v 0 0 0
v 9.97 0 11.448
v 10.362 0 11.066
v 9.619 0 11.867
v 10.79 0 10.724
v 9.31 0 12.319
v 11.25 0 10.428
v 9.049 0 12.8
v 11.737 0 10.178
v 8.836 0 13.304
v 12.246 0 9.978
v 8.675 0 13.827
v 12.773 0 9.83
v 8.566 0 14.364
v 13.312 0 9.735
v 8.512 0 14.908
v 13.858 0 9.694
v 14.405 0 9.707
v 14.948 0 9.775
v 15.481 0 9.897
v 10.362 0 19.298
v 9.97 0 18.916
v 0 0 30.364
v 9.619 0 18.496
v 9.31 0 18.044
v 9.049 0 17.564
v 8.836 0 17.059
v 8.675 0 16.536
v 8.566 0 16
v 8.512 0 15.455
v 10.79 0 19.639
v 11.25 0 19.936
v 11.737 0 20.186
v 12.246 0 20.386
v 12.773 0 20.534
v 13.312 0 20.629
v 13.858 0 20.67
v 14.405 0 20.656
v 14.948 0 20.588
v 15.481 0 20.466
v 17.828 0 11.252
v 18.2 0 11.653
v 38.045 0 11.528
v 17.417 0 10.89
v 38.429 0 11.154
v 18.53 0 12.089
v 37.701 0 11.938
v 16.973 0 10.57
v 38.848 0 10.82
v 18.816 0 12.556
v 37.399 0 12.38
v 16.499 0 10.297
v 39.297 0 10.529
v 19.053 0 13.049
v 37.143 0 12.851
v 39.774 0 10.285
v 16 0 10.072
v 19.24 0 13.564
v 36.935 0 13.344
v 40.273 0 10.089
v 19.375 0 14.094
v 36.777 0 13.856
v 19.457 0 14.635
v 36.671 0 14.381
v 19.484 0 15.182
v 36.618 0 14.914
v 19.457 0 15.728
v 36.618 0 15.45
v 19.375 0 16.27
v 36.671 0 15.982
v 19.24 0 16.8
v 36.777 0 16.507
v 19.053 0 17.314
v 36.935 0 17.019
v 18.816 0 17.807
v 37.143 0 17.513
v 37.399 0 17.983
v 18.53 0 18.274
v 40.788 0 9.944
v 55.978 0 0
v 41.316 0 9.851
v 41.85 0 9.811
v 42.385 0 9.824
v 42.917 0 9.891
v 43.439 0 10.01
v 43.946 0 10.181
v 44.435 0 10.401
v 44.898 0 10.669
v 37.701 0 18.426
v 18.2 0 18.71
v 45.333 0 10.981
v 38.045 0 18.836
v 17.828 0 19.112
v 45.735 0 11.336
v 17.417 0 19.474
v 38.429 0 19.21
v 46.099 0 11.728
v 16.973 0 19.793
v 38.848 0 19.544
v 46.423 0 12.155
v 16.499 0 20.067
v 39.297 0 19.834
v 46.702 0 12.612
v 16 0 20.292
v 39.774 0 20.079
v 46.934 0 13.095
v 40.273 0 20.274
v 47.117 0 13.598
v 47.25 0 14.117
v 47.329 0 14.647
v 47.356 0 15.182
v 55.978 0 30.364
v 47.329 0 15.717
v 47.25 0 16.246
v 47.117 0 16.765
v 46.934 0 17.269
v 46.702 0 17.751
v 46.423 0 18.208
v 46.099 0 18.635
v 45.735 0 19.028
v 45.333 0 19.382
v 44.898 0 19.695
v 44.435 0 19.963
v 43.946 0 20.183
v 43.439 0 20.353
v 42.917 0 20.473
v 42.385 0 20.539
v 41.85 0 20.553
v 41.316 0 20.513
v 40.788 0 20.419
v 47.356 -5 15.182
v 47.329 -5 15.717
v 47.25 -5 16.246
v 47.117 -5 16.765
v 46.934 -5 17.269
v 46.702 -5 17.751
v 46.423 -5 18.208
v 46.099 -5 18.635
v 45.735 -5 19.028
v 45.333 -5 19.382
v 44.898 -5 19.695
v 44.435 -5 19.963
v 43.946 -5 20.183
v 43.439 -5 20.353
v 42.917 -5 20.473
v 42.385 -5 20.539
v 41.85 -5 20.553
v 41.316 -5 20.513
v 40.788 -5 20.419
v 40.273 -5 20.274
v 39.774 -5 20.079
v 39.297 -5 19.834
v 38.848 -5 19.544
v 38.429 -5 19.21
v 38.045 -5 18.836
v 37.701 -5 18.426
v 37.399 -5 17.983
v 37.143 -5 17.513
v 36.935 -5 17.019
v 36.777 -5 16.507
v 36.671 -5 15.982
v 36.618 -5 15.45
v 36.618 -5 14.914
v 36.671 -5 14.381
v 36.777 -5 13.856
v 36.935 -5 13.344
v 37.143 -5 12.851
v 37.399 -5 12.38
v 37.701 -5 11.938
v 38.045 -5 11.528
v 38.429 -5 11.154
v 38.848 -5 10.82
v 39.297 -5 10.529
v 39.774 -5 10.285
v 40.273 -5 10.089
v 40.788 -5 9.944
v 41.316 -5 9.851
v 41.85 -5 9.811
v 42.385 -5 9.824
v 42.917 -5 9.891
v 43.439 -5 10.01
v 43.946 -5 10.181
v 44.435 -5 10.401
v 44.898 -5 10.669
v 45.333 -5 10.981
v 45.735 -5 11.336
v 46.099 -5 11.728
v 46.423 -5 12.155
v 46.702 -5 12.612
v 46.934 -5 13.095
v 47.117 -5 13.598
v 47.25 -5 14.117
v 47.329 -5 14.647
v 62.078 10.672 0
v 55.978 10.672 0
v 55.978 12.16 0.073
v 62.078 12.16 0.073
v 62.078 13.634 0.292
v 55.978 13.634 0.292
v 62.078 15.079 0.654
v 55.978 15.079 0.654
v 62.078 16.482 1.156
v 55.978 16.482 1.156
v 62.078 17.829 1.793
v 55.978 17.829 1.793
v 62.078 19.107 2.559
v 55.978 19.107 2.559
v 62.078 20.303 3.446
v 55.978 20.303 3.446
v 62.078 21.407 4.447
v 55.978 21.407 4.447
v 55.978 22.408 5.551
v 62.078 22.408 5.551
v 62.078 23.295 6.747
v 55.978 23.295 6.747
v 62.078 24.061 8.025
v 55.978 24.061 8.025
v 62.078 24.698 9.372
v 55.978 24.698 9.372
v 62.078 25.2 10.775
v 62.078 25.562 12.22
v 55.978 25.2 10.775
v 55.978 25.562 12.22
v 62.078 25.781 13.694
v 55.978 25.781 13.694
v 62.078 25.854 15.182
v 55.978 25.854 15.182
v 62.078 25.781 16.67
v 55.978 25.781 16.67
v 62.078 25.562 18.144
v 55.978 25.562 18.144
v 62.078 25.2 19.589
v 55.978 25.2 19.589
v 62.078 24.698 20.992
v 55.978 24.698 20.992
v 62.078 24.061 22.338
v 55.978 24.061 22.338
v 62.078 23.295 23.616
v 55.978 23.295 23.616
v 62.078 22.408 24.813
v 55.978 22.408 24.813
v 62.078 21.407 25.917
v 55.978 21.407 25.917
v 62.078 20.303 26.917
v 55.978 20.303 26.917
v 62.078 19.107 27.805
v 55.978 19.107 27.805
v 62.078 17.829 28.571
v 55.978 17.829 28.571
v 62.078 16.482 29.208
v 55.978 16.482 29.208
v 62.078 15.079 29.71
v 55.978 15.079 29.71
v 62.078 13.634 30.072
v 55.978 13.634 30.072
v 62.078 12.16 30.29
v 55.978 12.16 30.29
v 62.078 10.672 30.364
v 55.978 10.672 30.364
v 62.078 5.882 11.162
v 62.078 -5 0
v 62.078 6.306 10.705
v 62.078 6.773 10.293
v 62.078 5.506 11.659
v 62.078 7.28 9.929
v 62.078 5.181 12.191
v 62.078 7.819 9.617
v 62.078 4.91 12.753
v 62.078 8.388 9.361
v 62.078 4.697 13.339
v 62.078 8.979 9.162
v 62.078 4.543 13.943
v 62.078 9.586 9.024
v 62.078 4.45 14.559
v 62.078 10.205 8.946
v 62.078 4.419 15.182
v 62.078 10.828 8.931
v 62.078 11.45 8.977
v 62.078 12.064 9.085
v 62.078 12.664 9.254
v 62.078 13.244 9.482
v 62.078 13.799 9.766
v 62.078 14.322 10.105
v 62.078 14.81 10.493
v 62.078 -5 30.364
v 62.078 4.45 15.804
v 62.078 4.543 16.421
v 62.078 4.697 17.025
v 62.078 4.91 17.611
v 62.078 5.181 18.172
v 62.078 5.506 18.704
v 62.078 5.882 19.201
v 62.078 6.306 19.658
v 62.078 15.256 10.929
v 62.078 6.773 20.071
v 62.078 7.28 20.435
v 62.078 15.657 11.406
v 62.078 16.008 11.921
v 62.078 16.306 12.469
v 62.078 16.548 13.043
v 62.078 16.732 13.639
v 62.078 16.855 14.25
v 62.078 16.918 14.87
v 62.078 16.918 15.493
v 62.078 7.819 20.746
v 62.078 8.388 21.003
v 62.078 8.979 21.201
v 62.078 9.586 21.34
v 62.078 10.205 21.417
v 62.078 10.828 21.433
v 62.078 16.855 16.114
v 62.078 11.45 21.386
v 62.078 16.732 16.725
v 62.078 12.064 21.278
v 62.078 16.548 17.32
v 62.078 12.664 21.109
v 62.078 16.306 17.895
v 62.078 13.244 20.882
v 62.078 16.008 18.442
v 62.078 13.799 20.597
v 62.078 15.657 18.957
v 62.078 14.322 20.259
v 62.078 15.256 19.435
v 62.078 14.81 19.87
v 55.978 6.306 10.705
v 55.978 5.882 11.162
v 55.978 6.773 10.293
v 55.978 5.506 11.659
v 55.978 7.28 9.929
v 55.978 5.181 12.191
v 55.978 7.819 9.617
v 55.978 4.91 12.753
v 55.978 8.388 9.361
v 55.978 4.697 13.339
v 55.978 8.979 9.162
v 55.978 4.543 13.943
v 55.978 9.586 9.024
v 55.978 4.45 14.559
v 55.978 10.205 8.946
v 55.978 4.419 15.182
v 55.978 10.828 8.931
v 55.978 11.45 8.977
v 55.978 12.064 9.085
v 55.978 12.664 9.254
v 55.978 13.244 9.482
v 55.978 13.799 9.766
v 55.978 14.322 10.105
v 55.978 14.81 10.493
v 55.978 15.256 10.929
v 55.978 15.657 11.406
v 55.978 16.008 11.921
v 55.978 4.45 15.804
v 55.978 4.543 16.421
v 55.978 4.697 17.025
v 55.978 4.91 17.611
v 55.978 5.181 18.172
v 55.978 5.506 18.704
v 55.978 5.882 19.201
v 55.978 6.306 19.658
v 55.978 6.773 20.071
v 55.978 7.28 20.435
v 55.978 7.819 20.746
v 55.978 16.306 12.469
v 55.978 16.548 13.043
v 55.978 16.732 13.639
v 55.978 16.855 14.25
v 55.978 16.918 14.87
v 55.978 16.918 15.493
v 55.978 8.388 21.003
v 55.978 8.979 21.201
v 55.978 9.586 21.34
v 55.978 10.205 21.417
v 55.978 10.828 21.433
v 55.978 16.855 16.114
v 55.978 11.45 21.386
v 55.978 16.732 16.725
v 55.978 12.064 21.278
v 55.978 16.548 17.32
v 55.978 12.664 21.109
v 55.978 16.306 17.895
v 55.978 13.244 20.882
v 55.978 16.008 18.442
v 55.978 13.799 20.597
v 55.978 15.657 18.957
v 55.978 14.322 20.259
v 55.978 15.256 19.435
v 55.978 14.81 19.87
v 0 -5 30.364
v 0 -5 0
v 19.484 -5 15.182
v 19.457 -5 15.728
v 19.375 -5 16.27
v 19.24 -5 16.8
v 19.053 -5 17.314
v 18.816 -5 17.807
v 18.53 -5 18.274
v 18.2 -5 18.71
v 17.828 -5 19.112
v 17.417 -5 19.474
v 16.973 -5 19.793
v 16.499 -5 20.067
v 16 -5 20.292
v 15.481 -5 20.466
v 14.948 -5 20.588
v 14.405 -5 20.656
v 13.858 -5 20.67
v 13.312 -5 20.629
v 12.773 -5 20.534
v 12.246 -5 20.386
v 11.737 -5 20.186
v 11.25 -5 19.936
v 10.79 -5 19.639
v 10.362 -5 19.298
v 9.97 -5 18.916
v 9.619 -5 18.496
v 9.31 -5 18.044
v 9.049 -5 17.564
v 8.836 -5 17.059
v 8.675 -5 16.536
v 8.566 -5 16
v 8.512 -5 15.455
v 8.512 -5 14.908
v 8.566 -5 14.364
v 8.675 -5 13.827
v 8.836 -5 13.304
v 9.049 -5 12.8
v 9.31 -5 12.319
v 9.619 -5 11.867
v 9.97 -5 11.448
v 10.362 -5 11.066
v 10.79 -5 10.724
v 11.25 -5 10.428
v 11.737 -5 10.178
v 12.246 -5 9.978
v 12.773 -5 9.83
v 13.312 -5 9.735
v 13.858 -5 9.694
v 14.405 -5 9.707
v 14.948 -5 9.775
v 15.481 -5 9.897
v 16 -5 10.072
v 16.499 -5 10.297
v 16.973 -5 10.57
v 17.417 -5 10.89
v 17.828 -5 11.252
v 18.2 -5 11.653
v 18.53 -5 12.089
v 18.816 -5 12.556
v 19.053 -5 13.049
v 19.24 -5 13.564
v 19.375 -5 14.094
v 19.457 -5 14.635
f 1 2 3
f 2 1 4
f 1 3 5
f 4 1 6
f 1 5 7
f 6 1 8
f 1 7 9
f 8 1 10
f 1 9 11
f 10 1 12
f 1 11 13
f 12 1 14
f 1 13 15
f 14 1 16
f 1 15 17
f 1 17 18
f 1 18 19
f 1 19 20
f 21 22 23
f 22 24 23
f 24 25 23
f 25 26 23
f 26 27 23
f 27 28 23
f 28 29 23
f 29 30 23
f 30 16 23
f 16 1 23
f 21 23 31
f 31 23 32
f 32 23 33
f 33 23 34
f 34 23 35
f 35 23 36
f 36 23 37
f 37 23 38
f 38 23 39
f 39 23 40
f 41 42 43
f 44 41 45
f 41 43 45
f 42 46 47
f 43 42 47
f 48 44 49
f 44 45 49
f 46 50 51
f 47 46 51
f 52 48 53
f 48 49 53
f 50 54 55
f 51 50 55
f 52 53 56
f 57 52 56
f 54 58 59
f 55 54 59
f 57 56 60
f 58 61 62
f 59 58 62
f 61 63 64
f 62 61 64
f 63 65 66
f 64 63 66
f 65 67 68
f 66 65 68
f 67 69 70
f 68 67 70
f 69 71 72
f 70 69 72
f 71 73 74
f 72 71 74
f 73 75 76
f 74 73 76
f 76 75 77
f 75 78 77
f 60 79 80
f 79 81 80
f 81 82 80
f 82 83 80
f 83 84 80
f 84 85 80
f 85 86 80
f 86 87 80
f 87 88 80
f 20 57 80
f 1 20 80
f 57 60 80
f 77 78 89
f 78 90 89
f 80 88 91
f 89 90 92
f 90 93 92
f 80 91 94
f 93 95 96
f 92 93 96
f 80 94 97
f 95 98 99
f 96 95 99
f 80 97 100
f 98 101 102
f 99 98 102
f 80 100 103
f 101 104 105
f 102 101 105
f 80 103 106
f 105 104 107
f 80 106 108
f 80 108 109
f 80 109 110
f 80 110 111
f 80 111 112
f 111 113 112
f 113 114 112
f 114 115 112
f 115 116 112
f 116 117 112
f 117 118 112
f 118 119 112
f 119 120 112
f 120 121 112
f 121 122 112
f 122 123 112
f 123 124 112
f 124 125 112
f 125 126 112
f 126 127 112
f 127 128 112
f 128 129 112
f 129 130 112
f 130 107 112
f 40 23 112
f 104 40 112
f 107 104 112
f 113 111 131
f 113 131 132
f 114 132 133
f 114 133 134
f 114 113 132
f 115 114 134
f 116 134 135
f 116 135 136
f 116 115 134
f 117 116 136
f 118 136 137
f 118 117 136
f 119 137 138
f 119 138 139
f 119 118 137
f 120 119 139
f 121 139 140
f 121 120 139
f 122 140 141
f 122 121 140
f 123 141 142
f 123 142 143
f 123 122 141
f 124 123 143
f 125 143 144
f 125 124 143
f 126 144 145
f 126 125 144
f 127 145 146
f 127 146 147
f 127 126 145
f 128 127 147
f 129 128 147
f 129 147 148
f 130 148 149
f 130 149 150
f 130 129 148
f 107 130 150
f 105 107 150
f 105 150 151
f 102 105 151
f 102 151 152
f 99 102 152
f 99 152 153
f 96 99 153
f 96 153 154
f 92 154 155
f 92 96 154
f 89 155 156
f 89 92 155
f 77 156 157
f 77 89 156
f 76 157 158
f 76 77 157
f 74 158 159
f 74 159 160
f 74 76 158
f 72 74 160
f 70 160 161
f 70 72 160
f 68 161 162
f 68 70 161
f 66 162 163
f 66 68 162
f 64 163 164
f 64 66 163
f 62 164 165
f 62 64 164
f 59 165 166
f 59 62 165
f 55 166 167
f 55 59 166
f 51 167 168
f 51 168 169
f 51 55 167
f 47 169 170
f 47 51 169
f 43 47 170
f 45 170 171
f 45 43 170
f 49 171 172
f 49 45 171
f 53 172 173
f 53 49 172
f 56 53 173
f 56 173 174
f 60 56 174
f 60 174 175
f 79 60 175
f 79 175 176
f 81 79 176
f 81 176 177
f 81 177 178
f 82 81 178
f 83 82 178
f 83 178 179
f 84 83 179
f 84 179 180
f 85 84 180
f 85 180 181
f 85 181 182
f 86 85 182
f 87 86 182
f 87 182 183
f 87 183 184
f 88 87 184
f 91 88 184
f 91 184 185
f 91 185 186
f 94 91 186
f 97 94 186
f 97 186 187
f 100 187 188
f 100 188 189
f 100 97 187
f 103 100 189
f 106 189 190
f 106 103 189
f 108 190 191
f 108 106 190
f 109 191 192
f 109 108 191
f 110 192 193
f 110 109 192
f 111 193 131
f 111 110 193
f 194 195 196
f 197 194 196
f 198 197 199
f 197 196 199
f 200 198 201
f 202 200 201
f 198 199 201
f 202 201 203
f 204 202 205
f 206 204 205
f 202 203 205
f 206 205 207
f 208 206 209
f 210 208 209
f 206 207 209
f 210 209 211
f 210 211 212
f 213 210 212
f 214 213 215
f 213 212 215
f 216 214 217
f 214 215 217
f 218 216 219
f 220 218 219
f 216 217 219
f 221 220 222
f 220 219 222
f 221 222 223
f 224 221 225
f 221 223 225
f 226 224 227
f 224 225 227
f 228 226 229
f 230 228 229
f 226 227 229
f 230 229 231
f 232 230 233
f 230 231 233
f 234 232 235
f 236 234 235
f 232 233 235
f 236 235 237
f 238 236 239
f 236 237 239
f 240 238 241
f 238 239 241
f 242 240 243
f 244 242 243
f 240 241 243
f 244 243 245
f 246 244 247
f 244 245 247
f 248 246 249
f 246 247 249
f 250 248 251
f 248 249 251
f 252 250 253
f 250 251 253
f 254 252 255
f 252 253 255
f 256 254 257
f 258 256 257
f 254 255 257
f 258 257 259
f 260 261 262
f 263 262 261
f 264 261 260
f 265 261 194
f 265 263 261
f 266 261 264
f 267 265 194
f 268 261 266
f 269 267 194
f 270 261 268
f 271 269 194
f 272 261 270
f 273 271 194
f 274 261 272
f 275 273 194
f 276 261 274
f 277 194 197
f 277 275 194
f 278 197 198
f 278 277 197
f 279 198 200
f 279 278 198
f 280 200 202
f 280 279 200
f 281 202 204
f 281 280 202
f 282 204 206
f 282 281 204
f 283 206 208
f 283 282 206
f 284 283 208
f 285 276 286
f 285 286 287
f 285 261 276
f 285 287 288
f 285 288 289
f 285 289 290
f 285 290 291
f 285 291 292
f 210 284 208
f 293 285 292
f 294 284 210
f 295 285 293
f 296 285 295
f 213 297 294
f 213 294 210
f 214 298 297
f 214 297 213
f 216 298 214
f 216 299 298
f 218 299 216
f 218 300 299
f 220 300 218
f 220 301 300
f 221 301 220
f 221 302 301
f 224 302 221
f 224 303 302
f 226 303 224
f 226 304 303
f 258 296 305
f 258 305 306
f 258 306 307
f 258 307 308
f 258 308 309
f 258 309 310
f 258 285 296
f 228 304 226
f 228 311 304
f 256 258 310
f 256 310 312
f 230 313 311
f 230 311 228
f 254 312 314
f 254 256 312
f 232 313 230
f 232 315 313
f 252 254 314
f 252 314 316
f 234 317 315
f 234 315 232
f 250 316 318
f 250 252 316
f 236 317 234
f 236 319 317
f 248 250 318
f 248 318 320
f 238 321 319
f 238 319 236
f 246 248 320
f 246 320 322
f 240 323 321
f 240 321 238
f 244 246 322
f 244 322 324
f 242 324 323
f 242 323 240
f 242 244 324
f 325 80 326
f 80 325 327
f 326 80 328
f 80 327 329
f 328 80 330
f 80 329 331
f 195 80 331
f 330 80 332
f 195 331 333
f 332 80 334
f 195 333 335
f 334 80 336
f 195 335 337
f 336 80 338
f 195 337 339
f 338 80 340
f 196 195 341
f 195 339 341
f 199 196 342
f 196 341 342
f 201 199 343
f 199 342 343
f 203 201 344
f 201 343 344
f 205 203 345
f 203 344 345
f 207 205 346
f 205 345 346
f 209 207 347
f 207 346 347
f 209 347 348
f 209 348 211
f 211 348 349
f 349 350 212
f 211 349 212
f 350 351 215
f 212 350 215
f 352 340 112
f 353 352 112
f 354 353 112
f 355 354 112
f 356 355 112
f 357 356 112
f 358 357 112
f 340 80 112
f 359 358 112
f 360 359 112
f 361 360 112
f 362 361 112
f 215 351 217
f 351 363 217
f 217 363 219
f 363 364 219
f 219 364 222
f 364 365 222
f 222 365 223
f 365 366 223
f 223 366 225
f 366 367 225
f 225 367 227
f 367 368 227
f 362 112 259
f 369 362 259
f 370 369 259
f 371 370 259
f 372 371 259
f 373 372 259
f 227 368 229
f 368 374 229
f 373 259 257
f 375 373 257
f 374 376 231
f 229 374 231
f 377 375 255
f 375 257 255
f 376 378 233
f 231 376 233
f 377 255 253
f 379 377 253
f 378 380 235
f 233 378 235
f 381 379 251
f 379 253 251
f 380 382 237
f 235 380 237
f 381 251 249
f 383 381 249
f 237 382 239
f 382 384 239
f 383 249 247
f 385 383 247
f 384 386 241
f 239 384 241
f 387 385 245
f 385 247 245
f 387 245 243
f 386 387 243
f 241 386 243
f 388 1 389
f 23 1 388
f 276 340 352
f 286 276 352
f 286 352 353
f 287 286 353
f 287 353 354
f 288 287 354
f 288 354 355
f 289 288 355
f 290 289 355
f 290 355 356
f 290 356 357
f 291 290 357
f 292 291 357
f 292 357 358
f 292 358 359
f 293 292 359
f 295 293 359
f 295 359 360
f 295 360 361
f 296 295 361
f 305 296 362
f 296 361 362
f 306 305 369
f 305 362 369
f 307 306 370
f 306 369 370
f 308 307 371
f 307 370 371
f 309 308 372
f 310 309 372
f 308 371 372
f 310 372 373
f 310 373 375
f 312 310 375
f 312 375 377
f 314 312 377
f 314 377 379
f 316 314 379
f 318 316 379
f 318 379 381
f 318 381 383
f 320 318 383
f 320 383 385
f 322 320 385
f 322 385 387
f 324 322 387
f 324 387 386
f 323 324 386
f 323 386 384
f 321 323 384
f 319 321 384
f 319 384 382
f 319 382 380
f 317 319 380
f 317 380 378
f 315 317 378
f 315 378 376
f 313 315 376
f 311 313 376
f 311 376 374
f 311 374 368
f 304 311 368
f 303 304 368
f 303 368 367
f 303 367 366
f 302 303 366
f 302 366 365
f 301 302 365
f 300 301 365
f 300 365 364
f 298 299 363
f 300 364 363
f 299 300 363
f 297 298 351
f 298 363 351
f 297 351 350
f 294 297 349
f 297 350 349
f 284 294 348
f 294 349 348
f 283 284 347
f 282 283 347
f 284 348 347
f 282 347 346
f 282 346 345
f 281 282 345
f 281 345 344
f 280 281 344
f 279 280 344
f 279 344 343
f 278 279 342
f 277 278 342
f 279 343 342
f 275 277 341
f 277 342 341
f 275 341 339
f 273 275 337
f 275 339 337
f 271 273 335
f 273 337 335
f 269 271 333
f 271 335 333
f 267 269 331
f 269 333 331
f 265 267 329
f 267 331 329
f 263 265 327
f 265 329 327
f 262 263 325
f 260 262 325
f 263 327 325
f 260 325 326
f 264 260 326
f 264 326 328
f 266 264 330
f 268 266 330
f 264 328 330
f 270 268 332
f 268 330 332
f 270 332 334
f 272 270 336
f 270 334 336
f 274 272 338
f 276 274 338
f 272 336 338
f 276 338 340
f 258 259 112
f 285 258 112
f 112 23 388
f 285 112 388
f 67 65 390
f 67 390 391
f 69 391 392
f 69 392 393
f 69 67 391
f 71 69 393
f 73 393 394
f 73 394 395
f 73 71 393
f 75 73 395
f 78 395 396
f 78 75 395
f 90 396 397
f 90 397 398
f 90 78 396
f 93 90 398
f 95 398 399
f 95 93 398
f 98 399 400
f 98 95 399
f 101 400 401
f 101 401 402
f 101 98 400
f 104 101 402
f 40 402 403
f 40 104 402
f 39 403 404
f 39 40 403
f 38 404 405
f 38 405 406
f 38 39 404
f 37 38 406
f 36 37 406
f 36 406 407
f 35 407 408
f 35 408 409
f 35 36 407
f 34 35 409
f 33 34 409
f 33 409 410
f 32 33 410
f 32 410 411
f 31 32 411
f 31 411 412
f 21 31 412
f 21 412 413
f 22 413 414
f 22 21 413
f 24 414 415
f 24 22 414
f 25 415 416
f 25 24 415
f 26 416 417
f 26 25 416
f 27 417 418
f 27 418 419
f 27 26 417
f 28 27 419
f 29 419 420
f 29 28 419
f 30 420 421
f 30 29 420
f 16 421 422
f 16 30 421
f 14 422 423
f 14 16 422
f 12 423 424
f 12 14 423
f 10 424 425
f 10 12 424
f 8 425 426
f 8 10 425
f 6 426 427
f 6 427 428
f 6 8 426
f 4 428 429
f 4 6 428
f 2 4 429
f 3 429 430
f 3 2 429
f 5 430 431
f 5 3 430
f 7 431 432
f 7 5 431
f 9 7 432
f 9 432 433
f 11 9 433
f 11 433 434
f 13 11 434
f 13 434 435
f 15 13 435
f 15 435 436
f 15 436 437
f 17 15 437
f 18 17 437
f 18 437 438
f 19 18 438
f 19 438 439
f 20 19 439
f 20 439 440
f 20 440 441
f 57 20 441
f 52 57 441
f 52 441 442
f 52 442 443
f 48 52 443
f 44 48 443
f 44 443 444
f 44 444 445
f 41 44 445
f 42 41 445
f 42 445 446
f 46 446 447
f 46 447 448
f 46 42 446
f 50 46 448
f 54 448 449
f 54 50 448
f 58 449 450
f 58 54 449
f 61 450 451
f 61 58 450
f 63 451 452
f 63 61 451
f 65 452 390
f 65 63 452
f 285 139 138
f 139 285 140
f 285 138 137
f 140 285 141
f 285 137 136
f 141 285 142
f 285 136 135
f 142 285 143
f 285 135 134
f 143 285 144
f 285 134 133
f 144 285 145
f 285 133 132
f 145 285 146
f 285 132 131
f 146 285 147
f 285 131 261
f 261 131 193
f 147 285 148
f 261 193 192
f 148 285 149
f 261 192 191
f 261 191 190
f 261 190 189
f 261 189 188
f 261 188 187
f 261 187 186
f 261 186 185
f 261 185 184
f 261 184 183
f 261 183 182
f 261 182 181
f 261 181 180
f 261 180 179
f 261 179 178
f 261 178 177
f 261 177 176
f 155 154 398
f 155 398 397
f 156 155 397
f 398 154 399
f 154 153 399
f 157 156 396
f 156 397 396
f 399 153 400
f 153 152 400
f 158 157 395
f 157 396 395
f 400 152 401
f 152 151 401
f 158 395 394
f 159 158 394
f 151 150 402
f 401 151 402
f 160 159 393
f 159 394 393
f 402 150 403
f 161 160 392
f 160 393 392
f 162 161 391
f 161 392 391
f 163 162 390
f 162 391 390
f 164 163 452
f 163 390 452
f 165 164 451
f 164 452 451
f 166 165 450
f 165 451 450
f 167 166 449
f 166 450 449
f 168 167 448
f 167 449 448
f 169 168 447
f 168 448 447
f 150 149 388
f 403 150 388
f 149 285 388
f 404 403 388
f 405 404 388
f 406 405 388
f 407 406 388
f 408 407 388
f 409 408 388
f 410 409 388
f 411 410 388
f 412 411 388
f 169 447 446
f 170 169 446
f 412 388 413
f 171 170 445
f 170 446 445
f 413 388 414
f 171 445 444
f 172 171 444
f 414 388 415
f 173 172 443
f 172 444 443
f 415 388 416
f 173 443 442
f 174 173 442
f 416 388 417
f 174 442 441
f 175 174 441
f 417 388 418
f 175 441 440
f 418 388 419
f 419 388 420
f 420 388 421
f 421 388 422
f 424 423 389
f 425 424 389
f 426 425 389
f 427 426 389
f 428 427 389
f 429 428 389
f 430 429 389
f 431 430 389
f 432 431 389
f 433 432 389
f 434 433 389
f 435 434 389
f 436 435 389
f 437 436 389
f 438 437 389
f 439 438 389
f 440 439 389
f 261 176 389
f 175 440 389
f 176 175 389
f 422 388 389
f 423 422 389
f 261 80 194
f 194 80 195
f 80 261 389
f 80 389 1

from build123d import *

# Parameters (mm, degrees)
F0_W     = 55.978216
F0_H     = 30.363508
F0_R     = 5.489689
F0_R_2   = 5.372442
F1_DEPTH = 5
F3_DEPTH = 6.1
F4_R     = 6.25311
F5_DEPTH = 25


with BuildPart() as f1:
    # F0 (on Front) → F1 (new body)
    with BuildSketch(Plane.XZ):
        with Locations((27.989108, 15.181754)):
            Rectangle(F0_W, F0_H)
        with Locations((13.994554, 15.181754)):
            Circle(F0_R, mode=Mode.SUBTRACT)
        with Locations((41.983662, 15.181754)):
            Circle(F0_R_2, mode=Mode.SUBTRACT)
    extrude(amount=F1_DEPTH)

    # F2 (on face) → F3 (join)
    with BuildSketch(Plane.YZ.offset(55.978216)):
        with BuildLine():
            Line((10.672215, 30.363508), (0, 30.363508))
            Line((0, 30.363508), (-5, 30.363508))
            Line((-5, 30.363508), (-5, 0))
            Line((-5, 0), (0, 0))
            Line((0, 0), (10.672215, 0))
            ThreePointArc((10.672215, 0), (25.853969, 15.181754), (10.672215, 30.363508))
        make_face()
    extrude(amount=F3_DEPTH)

    # F4 (on face) → F5 (cut)
    with BuildSketch(Plane(origin=(55.978216, 0, 0), x_dir=(0, -1, 0), z_dir=(-1, 0, 0))):
        with Locations((-10.672215, 15.181754)):
            Circle(F4_R)
    extrude(amount=-F5_DEPTH, mode=Mode.SUBTRACT)


solid = f1.part
